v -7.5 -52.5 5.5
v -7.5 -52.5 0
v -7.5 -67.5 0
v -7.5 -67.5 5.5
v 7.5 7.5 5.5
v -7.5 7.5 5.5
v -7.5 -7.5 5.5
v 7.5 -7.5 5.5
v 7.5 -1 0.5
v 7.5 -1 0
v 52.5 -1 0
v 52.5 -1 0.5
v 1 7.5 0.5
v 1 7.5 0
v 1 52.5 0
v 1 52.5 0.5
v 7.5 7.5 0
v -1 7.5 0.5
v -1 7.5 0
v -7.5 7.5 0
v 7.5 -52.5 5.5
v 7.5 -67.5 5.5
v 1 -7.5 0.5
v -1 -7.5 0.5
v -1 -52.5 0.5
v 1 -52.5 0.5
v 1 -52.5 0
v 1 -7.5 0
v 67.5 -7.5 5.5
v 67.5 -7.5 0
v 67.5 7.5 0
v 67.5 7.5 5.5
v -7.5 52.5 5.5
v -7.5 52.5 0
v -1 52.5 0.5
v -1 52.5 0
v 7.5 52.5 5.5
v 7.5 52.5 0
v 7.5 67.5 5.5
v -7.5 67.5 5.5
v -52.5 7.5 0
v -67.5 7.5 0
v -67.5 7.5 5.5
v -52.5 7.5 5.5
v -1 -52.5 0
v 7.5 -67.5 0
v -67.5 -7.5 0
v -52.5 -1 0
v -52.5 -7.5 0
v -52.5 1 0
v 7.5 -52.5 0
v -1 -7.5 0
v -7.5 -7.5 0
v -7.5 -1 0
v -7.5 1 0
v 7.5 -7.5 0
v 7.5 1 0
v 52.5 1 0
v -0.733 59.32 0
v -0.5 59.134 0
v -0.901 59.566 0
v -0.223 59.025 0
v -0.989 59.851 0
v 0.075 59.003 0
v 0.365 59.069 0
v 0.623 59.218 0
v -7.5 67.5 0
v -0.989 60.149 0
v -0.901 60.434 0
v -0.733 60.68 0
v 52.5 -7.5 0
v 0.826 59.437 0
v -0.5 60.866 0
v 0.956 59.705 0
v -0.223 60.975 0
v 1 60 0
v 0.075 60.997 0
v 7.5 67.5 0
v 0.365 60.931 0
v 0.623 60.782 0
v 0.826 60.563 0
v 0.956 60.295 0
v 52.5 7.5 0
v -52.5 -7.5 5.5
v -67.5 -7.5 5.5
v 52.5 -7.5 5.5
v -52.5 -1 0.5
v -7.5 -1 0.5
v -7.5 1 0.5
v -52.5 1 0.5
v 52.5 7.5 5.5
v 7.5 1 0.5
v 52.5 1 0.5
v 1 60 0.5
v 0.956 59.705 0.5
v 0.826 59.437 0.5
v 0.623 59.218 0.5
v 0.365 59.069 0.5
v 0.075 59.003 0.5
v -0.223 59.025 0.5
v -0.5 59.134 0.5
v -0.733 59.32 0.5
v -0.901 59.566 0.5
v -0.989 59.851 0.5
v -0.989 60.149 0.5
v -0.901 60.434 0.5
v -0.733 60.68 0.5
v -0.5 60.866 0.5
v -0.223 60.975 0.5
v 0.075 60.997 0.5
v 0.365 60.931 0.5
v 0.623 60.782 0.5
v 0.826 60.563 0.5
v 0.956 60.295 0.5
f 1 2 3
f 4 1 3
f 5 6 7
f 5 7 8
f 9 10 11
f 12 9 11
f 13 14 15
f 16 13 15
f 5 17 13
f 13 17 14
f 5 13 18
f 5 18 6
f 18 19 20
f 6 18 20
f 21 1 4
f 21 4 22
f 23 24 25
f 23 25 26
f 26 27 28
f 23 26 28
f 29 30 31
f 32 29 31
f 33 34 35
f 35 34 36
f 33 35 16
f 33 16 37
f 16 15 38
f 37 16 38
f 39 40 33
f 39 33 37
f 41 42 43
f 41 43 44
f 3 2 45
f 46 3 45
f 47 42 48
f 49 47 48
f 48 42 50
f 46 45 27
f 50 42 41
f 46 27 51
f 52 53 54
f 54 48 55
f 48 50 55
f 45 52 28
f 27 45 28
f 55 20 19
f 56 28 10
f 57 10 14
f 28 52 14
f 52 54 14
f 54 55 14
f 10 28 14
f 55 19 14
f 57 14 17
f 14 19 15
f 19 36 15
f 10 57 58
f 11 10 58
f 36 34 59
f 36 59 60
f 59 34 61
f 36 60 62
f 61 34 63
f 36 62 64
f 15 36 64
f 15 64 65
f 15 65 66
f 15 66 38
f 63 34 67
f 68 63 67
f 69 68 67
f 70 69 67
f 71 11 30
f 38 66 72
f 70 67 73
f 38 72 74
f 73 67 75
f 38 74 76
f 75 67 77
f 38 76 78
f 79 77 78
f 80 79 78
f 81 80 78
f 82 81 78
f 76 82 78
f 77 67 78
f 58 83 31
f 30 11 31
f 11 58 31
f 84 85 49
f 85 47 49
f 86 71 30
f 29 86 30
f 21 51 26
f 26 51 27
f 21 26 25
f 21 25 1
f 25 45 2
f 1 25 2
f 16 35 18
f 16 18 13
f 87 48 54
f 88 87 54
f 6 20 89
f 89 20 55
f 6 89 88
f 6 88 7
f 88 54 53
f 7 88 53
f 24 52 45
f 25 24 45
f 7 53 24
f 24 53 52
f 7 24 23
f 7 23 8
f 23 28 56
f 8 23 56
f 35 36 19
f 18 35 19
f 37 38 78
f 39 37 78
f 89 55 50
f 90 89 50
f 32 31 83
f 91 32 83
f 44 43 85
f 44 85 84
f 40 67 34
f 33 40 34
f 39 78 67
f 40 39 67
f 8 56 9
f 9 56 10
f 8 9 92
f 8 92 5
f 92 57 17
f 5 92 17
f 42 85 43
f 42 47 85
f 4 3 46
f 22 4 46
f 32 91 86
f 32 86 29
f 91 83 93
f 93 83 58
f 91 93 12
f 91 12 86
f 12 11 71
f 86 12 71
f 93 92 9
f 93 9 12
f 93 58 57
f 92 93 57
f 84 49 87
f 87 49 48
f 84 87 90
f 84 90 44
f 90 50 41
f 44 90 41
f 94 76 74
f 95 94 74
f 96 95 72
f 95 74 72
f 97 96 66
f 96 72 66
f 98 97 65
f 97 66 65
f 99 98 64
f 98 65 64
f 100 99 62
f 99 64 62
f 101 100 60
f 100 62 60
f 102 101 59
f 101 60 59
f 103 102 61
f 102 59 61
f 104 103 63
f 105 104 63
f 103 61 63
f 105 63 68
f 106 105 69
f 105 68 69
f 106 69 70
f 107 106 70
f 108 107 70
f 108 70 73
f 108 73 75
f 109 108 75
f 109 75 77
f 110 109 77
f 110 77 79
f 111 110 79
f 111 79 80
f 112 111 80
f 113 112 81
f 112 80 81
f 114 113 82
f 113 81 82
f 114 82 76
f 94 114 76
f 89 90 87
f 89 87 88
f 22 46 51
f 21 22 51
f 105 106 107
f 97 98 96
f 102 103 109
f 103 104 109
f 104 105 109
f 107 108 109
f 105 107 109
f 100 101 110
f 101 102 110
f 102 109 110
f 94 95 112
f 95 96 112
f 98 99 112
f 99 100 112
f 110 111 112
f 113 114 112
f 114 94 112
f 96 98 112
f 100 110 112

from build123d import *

# Parameters (mm, degrees)
F1_DEPTH = 0.5
F2_R     = 1
F3_DEPTH = 0.5
F4_W     = 15
F4_H     = 15
F5_DEPTH = 5


with BuildPart() as f1:
    # F0 (on Top) → F1 (new body)
    with BuildSketch(Plane.XY):
        Polygon((7.5, 67.5), (0, 67.5), (-7.5, 67.5), (-7.5, 52.5), (-1, 52.5), (-1, 7.5), (-7.5, 7.5), (-7.5, 1), (-52.5, 1), (-52.5, 7.5), (-67.5, 7.5), (-67.5, 0), (-67.5, -7.5), (-52.5, -7.5), (-52.5, -1), (-7.5, -1), (-7.5, -7.5), (-1, -7.5), (-1, -52.5), (-7.5, -52.5), (-7.5, -67.5), (0, -67.5), (7.5, -67.5), (7.5, -52.5), (1, -52.5), (1, -7.5), (7.5, -7.5), (7.5, -1), (52.5, -1), (52.5, -7.5), (67.5, -7.5), (67.5, 0), (67.5, 7.5), (52.5, 7.5), (52.5, 1), (7.5, 1), (7.5, 7.5), (1, 7.5), (1, 52.5), (7.5, 52.5), align=None)
    extrude(amount=F1_DEPTH)

    # F2 (on face) → F3 (cut, through all)
    with BuildSketch(Plane(origin=(0, 0, 0), x_dir=(1, 0, 0), z_dir=(0, 0, -1))):
        with Locations((0, -60)):
            Circle(F2_R)
    extrude(amount=-F3_DEPTH, mode=Mode.SUBTRACT)

    # F4 (on face) → F5 (join)
    with BuildSketch(Plane.XY.offset(0.5)):
        with Locations((-60, 0)):
            Rectangle(F4_W, F4_H)
        with Locations((0, 60)):
            Rectangle(F4_W, F4_H)
        with Locations((60, 0)):
            Rectangle(F4_W, F4_H)
        Rectangle(F4_W, F4_H)
        with Locations((0, -60)):
            Rectangle(F4_W, F4_H)
    extrude(amount=F5_DEPTH)


solid = f1.part
